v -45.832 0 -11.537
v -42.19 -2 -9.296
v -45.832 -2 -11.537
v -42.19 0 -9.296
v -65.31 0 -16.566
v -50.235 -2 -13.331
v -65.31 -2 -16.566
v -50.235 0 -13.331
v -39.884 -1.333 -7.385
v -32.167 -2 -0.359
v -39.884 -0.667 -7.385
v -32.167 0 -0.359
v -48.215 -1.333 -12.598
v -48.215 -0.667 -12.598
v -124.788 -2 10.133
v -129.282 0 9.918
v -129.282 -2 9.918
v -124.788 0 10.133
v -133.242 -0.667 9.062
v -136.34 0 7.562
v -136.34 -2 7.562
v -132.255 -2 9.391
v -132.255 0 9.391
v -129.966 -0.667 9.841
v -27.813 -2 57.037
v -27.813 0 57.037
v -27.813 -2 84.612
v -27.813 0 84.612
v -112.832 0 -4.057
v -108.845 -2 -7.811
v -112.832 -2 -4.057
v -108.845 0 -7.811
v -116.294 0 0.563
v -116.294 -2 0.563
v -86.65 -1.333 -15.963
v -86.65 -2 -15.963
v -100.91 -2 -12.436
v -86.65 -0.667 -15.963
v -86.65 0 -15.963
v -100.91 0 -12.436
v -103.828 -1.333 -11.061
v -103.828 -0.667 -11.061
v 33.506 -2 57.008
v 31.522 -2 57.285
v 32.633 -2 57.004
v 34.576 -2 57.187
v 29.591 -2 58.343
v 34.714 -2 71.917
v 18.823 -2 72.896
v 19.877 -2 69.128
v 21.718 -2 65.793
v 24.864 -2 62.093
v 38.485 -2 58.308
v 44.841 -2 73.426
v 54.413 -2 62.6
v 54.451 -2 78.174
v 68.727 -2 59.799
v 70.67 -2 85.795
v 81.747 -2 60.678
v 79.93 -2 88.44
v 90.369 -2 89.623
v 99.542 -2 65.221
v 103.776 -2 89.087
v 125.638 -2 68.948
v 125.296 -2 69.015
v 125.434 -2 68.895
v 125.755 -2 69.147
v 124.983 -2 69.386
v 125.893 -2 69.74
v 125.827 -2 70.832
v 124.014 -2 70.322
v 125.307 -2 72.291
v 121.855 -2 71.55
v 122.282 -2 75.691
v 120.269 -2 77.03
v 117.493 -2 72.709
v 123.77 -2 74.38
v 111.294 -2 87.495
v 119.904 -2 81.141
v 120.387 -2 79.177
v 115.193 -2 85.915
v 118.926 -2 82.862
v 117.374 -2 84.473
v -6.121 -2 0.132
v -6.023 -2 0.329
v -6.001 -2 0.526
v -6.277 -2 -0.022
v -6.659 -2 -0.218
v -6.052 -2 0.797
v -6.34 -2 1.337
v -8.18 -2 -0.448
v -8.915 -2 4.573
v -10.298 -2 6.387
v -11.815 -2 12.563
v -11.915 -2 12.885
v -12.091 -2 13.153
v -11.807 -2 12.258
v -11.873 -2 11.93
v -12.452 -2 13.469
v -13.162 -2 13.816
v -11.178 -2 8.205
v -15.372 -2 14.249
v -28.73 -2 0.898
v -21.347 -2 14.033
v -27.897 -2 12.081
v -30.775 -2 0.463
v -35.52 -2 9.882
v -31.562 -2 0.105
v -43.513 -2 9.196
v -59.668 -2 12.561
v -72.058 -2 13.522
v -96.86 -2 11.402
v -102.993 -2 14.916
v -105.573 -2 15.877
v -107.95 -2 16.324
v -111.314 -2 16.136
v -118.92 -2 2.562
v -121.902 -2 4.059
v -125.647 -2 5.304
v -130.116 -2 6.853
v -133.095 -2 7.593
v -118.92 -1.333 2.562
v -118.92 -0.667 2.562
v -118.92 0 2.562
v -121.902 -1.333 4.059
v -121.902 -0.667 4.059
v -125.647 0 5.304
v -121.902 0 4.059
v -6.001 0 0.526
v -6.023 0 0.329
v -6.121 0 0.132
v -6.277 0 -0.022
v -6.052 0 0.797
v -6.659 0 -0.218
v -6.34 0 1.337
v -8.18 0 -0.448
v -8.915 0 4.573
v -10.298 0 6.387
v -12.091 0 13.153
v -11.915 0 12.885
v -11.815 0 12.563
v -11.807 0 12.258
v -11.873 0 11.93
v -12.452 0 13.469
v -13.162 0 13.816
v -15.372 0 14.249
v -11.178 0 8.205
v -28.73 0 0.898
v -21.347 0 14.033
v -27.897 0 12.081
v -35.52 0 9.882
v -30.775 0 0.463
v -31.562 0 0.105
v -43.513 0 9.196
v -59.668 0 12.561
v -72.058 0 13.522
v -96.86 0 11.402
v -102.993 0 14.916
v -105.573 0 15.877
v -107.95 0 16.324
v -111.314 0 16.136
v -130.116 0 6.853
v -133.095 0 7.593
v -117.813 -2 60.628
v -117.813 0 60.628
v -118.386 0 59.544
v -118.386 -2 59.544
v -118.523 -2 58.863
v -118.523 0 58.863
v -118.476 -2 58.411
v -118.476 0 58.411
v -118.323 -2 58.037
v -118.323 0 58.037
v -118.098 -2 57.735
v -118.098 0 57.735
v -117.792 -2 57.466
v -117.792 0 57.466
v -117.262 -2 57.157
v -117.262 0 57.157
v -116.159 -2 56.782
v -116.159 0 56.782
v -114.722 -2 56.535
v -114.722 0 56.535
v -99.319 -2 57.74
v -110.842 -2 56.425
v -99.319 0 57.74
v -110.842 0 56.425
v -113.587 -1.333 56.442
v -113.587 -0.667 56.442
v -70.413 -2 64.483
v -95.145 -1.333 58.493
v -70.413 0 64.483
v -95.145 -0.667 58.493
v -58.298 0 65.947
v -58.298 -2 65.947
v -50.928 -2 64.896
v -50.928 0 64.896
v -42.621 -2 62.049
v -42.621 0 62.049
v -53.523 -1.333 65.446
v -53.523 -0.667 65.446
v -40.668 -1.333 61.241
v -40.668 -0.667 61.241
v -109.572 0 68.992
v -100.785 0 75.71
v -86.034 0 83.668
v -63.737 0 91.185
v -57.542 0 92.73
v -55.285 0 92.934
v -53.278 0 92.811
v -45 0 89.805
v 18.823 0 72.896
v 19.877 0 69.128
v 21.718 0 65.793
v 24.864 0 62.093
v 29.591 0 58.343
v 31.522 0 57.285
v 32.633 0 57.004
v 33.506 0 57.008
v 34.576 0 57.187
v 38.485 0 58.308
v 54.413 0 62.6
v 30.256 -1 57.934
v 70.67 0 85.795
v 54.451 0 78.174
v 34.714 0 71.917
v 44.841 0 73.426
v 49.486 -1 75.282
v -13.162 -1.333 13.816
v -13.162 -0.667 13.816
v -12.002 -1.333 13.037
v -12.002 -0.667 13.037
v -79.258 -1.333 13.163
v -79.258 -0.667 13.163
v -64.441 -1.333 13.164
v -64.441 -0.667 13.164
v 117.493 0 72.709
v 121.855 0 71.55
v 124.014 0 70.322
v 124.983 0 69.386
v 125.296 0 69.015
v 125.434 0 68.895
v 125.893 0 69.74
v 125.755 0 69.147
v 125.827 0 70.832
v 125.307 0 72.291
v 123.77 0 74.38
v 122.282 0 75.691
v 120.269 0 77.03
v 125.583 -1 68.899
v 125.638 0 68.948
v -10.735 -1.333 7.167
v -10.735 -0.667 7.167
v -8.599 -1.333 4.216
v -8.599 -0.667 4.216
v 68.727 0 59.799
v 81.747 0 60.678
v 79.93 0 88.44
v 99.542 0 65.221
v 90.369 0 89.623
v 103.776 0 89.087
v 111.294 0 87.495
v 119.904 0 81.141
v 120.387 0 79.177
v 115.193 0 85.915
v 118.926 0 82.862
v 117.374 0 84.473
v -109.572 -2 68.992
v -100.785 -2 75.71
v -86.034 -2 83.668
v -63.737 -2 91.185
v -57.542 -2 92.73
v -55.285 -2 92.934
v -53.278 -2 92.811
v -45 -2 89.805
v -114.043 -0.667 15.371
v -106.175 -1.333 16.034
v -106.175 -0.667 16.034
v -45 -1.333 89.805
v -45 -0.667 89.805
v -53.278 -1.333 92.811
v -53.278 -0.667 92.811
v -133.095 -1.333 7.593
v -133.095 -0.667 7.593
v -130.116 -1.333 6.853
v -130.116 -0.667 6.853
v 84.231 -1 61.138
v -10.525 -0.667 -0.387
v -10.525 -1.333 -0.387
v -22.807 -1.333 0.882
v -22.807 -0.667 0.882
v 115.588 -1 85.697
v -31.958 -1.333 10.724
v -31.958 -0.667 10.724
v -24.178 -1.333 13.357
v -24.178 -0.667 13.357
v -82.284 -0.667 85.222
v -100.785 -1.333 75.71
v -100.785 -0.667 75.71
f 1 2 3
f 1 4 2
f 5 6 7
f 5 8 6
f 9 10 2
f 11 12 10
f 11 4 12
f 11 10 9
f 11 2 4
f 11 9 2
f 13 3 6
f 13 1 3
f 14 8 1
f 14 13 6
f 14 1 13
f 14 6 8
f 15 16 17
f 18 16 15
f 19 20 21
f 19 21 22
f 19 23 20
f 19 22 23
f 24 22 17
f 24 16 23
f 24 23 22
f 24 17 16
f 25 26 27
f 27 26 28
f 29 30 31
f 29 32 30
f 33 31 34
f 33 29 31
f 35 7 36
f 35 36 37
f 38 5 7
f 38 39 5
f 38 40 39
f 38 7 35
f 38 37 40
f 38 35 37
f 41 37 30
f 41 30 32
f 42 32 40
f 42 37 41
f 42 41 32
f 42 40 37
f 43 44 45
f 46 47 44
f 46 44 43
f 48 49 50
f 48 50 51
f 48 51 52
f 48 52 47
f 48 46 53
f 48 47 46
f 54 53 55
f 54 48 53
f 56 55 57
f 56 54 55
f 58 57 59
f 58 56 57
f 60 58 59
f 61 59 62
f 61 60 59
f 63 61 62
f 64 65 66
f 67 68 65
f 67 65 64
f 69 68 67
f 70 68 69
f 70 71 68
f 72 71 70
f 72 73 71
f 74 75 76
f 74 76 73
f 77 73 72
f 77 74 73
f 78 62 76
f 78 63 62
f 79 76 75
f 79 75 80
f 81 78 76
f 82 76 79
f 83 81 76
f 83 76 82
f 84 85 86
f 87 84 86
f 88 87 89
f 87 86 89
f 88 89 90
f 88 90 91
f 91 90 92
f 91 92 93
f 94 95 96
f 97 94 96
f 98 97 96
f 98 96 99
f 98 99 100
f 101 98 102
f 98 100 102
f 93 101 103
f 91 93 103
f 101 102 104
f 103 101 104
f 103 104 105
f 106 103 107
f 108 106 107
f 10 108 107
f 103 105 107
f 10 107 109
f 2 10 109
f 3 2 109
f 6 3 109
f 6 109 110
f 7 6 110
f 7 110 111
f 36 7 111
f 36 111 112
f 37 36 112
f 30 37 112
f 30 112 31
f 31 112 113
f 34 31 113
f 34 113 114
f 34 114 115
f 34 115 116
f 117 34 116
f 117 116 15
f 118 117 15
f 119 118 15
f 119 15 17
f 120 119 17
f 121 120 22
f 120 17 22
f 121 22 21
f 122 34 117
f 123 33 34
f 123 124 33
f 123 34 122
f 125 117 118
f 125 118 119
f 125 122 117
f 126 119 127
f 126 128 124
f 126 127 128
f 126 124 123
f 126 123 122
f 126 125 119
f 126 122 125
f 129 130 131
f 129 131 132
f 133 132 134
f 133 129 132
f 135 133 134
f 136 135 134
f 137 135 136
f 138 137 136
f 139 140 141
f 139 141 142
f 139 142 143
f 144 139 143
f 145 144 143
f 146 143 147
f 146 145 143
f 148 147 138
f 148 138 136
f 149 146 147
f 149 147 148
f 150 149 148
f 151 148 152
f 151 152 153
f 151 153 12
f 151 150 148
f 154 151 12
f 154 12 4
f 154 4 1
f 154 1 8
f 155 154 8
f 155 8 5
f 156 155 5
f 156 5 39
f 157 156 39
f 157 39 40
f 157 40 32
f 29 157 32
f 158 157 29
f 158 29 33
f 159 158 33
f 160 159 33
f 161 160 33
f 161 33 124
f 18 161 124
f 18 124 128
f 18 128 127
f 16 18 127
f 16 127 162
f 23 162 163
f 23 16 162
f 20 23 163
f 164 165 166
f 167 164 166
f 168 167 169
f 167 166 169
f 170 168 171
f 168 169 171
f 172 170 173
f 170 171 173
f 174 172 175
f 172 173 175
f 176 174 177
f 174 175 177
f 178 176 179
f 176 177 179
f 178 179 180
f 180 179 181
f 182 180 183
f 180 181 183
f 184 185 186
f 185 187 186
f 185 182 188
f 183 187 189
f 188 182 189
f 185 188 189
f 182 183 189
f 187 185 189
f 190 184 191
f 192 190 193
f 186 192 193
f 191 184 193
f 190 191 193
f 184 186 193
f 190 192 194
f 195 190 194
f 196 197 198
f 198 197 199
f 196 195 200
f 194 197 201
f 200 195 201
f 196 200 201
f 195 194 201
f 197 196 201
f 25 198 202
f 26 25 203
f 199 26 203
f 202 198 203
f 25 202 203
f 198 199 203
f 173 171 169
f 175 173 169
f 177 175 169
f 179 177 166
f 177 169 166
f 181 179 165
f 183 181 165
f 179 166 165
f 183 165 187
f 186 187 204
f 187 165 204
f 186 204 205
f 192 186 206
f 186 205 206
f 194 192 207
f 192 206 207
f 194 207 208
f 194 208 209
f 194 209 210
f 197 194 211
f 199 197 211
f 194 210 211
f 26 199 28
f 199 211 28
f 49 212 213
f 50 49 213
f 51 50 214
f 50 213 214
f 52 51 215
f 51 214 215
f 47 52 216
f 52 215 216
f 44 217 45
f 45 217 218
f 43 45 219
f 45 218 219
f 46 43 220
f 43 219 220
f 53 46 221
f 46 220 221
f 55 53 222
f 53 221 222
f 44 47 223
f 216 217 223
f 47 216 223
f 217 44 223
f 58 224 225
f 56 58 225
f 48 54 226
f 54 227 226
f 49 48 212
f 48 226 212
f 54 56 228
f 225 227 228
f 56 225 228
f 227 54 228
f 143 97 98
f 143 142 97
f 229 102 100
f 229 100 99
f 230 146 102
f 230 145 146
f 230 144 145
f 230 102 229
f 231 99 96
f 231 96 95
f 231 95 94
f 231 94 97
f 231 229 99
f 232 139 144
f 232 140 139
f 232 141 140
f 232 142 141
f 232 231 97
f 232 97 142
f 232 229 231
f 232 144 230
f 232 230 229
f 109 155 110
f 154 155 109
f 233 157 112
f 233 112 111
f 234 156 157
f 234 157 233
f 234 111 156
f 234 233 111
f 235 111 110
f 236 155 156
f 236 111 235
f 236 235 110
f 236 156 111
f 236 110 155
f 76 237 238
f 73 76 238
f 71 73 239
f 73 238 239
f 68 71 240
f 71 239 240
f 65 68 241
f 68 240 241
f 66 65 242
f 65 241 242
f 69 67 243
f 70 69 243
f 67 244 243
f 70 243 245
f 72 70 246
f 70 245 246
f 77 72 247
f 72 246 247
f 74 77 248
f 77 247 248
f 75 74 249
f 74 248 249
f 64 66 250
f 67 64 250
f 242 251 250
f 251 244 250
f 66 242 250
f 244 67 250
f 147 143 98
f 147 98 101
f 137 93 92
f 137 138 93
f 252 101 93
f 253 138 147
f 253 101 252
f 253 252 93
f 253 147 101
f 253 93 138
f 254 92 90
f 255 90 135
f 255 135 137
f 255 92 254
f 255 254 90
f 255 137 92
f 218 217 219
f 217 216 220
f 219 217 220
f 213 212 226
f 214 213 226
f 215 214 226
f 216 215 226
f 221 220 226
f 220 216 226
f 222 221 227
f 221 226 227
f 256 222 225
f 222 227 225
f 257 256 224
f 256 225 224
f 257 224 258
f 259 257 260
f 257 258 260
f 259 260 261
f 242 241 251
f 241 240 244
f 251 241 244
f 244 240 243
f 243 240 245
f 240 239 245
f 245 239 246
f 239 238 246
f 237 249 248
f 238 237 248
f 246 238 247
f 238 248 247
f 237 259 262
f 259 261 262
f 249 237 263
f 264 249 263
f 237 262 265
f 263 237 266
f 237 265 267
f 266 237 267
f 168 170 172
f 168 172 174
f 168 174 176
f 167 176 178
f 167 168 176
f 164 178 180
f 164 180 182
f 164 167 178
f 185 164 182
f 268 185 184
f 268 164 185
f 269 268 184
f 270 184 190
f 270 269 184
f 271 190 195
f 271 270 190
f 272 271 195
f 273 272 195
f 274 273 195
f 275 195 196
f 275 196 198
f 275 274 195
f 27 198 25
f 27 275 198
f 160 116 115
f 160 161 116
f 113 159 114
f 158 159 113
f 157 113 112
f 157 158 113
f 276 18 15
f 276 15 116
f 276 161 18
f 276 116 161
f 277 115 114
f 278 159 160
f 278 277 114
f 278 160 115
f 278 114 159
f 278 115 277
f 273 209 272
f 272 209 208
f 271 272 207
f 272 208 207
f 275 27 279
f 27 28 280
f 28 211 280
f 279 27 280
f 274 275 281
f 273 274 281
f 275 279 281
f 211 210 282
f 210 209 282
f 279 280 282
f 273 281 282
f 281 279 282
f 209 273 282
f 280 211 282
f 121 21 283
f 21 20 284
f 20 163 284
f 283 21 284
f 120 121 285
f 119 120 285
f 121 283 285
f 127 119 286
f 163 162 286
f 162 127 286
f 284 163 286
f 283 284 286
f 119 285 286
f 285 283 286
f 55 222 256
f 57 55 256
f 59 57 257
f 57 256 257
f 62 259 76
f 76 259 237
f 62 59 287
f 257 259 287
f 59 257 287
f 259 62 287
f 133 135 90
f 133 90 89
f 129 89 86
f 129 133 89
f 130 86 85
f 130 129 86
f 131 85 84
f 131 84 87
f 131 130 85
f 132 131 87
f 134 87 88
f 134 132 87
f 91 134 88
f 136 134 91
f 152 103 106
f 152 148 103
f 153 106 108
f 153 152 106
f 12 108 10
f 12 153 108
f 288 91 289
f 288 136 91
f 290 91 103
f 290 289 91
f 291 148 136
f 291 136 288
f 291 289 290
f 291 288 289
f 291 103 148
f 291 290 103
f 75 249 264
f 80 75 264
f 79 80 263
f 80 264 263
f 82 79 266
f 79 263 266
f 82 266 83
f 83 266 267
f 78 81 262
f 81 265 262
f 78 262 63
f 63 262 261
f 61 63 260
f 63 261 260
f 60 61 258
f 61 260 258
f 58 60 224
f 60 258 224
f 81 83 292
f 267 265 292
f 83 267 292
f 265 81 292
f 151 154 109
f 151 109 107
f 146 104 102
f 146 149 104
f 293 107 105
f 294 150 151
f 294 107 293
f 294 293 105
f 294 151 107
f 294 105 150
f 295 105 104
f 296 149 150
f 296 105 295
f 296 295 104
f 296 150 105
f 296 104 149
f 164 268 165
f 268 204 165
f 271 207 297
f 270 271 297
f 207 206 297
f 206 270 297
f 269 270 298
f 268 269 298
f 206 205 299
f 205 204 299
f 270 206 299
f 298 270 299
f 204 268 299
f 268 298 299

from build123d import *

# Parameters (mm, degrees)
F1_DEPTH = 2
F2_DEPTH = 2
F3_DEPTH = 2


with BuildPart() as f1:
    # F0 (on Front) → F1 (new body)
    with BuildSketch(Plane.XZ):
        with BuildLine():
            add(Edge.make_bspline(
                [(18.8231425051, 72.8964428303), (19.8808436069, 65.3788038107), (34.7370776251, 53.7829384898), (33.5673388016, 57.6980862061), (54.4126917131, 62.6002282298)],
                knots=[0, 0, 0, 0, 0.4666218102, 1, 1, 1, 1], degree=3))
            add(Edge.make_bspline(
                [(54.4126917131, 62.6002282298), (65.8990881443, 58.8808907475), (83.7409495409, 59.5425556906), (106.919003505, 67.2676650688), (117.4929710335, 72.7085880731)],
                knots=[0, 0, 0, 0, 0.4793578106, 1, 1, 1, 1], degree=3))
            add(Edge.make_bspline(
                [(117.4929710335, 72.7085880731), (124.8398352237, 71.5507546419), (125.3568491925, 65.4595539697), (126.8634894168, 73.1862400584), (120.2690540196, 77.0300564117)],
                knots=[0, 0, 0, 0, 0.4896589483, 1, 1, 1, 1], degree=3))
            add(Edge.make_bspline(
                [(120.2690540196, 77.0300564117), (120.8694055814, 79.9586893693), (117.3485005207, 90.5158551947), (83.9879186797, 91.2811061004), (70.6700533378, 85.7948111885)],
                knots=[0, 0, 0, 0, 0.3189288468, 1, 1, 1, 1], degree=3))
            add(Edge.make_bspline(
                [(70.6700533378, 85.7948111885), (57.1444968179, 80.7355256917), (50.9577782702, 74.2254984537), (36.1678127727, 70.6001524196), (18.8231425051, 72.8964428303)],
                knots=[0, 0, 0, 0, 0.4672077511, 1, 1, 1, 1], degree=3))
        make_face()
    extrude(amount=F1_DEPTH)


with BuildPart() as f2:
    # F0 (on Front) → F2 (new body)
    with BuildSketch(Plane.XZ):
        with BuildLine():
            Line((-27.8131521207, 57.0369597776), (-27.8131521207, 84.6122249882))
            add(Edge.make_bspline(
                [(-27.8131521207, 84.6122249882), (-53.150113672, 90.0835245848), (-48.4915439647, 95.9429144754), (-63.7371170591, 91.1852139324)],
                knots=[0, 0, 0, 0, 36.5203428319, 36.5203428319, 36.5203428319, 36.5203428319], degree=3))
            add(Edge.make_bspline(
                [(-63.7371170591, 91.1852139324), (-81.8316591854, 86.3216825835), (-101.997328814, 79.1684429978), (-117.8131521207, 60.6284363369)],
                knots=[0, 0, 0, 0, 62.1122711306, 62.1122711306, 62.1122711306, 62.1122711306], degree=3))
            add(Edge.make_bspline(
                [(-117.8131521207, 60.6284363369), (-123.3351490576, 52.556851388), (-95.6494464383, 57.2901753206), (-70.413042105, 64.4827900117)],
                knots=[0, 0, 0, 0, 47.5565607645, 47.5565607645, 47.5565607645, 47.5565607645], degree=3))
            add(Edge.make_bspline(
                [(-70.413042105, 64.4827900117), (-50.1600168645, 69.7521343827), (-42.0131154488, 59.518903189), (-27.8131521207, 57.0369597776)],
                knots=[0, 0, 0, 0, 43.2457051573, 43.2457051573, 43.2457051573, 43.2457051573], degree=3))
        make_face()
    extrude(amount=F2_DEPTH)


with BuildPart() as f3:
    # F0 (on Front) → F3 (new body)
    with BuildSketch(Plane.XZ):
        with BuildLine():
            add(Edge.make_bspline(
                [(-136.3399773836, 7.5616859831), (-132.7563108469, 9.5010822872), (-131.491487591, 10.0070115895), (-124.7879223996, 10.1334939151)],
                knots=[0, 0, 0, 0, 11.8348709496, 11.8348709496, 11.8348709496, 11.8348709496], degree=3))
            add(Edge.make_bspline(
                [(-136.3399773836, 7.5616859831), (-132.3765755174, 7.9657551829), (-131.4472051335, 7.2697956545), (-125.6467953898, 5.3042598891)],
                knots=[0, 0, 0, 0, 10.9288660767, 10.9288660767, 10.9288660767, 10.9288660767], degree=3))
            add(Edge.make_bspline(
                [(-116.2942753437, 0.5631746987), (-118.8781786065, 2.8976393412), (-121.3850742849, 4.1009505828), (-125.6467953898, 5.3042598891)],
                knots=[0, 0, 0, 0, 10.4855862972, 10.4855862972, 10.4855862972, 10.4855862972], degree=3))
            add(Edge.make_bspline(
                [(-65.3102159774, -16.5664108198), (-88.5488057038, -17.3047020707), (-106.3669677607, -15.2302657525), (-116.2942753437, 0.5631746987)],
                knots=[0, 0, 0, 0, 53.7847284041, 53.7847284041, 53.7847284041, 53.7847284041], degree=3))
            add(Edge.make_bspline(
                [(-32.1668527531, -0.3589733213), (-42.295246662, -8.4791668787), (-41.1147423762, -13.0325344704), (-65.3102159774, -16.5664108198)],
                knots=[0, 0, 0, 0, 36.8939501285, 36.8939501285, 36.8939501285, 36.8939501285], degree=3))
            add(Edge.make_bspline(
                [(-6.3399773836, 1.3365404737), (-2.8032097663, -3.7166448916), (-27.941406029, 3.9710293128), (-32.1668527531, -0.3589733213)],
                knots=[0, 0, 0, 0, 25.8824700981, 25.8824700981, 25.8824700981, 25.8824700981], degree=3))
            add(Edge.make_bspline(
                [(-11.8726681078, 11.9301169345), (-11.5257585385, 5.6791028992), (-8.3684088692, 4.7616981841), (-6.3399773836, 1.3365404737)],
                knots=[0, 0, 0, 0, 11.9513400454, 11.9513400454, 11.9513400454, 11.9513400454], degree=3))
            add(Edge.make_bspline(
                [(-15.372011804, 14.2489602154), (-12.6315620613, 13.9959955642), (-11.4932191958, 13.1949421256), (-11.8726681078, 11.9301169345)],
                knots=[0, 0, 0, 0, 4.1979090587, 4.1979090587, 4.1979090587, 4.1979090587], degree=3))
            add(Edge.make_bspline(
                [(-43.5130200487, 9.1956122931), (-28.4711002373, 9.2234489712), (-26.2916570953, 15.1764979148), (-15.372011804, 14.2489602154)],
                knots=[0, 0, 0, 0, 28.5911292231, 28.5911292231, 28.5911292231, 28.5911292231], degree=3))
            add(Edge.make_bspline(
                [(-96.8597552071, 11.4016806448), (-74.8993506904, 13.3069197348), (-70.4632463631, 15.8848527423), (-43.5130200487, 9.1956122931)],
                knots=[0, 0, 0, 0, 53.3923298764, 53.3923298764, 53.3923298764, 53.3923298764], degree=3))
            add(Edge.make_bspline(
                [(-124.7879223996, 10.1334939151), (-111.1617562199, 17.4182929708), (-108.3413360205, 18.9223667122), (-96.8597552071, 11.4016806448)],
                knots=[0, 0, 0, 0, 27.9569458331, 27.9569458331, 27.9569458331, 27.9569458331], degree=3))
        make_face()
    extrude(amount=F3_DEPTH)


solid = Compound([f1.part, f2.part, f3.part])
